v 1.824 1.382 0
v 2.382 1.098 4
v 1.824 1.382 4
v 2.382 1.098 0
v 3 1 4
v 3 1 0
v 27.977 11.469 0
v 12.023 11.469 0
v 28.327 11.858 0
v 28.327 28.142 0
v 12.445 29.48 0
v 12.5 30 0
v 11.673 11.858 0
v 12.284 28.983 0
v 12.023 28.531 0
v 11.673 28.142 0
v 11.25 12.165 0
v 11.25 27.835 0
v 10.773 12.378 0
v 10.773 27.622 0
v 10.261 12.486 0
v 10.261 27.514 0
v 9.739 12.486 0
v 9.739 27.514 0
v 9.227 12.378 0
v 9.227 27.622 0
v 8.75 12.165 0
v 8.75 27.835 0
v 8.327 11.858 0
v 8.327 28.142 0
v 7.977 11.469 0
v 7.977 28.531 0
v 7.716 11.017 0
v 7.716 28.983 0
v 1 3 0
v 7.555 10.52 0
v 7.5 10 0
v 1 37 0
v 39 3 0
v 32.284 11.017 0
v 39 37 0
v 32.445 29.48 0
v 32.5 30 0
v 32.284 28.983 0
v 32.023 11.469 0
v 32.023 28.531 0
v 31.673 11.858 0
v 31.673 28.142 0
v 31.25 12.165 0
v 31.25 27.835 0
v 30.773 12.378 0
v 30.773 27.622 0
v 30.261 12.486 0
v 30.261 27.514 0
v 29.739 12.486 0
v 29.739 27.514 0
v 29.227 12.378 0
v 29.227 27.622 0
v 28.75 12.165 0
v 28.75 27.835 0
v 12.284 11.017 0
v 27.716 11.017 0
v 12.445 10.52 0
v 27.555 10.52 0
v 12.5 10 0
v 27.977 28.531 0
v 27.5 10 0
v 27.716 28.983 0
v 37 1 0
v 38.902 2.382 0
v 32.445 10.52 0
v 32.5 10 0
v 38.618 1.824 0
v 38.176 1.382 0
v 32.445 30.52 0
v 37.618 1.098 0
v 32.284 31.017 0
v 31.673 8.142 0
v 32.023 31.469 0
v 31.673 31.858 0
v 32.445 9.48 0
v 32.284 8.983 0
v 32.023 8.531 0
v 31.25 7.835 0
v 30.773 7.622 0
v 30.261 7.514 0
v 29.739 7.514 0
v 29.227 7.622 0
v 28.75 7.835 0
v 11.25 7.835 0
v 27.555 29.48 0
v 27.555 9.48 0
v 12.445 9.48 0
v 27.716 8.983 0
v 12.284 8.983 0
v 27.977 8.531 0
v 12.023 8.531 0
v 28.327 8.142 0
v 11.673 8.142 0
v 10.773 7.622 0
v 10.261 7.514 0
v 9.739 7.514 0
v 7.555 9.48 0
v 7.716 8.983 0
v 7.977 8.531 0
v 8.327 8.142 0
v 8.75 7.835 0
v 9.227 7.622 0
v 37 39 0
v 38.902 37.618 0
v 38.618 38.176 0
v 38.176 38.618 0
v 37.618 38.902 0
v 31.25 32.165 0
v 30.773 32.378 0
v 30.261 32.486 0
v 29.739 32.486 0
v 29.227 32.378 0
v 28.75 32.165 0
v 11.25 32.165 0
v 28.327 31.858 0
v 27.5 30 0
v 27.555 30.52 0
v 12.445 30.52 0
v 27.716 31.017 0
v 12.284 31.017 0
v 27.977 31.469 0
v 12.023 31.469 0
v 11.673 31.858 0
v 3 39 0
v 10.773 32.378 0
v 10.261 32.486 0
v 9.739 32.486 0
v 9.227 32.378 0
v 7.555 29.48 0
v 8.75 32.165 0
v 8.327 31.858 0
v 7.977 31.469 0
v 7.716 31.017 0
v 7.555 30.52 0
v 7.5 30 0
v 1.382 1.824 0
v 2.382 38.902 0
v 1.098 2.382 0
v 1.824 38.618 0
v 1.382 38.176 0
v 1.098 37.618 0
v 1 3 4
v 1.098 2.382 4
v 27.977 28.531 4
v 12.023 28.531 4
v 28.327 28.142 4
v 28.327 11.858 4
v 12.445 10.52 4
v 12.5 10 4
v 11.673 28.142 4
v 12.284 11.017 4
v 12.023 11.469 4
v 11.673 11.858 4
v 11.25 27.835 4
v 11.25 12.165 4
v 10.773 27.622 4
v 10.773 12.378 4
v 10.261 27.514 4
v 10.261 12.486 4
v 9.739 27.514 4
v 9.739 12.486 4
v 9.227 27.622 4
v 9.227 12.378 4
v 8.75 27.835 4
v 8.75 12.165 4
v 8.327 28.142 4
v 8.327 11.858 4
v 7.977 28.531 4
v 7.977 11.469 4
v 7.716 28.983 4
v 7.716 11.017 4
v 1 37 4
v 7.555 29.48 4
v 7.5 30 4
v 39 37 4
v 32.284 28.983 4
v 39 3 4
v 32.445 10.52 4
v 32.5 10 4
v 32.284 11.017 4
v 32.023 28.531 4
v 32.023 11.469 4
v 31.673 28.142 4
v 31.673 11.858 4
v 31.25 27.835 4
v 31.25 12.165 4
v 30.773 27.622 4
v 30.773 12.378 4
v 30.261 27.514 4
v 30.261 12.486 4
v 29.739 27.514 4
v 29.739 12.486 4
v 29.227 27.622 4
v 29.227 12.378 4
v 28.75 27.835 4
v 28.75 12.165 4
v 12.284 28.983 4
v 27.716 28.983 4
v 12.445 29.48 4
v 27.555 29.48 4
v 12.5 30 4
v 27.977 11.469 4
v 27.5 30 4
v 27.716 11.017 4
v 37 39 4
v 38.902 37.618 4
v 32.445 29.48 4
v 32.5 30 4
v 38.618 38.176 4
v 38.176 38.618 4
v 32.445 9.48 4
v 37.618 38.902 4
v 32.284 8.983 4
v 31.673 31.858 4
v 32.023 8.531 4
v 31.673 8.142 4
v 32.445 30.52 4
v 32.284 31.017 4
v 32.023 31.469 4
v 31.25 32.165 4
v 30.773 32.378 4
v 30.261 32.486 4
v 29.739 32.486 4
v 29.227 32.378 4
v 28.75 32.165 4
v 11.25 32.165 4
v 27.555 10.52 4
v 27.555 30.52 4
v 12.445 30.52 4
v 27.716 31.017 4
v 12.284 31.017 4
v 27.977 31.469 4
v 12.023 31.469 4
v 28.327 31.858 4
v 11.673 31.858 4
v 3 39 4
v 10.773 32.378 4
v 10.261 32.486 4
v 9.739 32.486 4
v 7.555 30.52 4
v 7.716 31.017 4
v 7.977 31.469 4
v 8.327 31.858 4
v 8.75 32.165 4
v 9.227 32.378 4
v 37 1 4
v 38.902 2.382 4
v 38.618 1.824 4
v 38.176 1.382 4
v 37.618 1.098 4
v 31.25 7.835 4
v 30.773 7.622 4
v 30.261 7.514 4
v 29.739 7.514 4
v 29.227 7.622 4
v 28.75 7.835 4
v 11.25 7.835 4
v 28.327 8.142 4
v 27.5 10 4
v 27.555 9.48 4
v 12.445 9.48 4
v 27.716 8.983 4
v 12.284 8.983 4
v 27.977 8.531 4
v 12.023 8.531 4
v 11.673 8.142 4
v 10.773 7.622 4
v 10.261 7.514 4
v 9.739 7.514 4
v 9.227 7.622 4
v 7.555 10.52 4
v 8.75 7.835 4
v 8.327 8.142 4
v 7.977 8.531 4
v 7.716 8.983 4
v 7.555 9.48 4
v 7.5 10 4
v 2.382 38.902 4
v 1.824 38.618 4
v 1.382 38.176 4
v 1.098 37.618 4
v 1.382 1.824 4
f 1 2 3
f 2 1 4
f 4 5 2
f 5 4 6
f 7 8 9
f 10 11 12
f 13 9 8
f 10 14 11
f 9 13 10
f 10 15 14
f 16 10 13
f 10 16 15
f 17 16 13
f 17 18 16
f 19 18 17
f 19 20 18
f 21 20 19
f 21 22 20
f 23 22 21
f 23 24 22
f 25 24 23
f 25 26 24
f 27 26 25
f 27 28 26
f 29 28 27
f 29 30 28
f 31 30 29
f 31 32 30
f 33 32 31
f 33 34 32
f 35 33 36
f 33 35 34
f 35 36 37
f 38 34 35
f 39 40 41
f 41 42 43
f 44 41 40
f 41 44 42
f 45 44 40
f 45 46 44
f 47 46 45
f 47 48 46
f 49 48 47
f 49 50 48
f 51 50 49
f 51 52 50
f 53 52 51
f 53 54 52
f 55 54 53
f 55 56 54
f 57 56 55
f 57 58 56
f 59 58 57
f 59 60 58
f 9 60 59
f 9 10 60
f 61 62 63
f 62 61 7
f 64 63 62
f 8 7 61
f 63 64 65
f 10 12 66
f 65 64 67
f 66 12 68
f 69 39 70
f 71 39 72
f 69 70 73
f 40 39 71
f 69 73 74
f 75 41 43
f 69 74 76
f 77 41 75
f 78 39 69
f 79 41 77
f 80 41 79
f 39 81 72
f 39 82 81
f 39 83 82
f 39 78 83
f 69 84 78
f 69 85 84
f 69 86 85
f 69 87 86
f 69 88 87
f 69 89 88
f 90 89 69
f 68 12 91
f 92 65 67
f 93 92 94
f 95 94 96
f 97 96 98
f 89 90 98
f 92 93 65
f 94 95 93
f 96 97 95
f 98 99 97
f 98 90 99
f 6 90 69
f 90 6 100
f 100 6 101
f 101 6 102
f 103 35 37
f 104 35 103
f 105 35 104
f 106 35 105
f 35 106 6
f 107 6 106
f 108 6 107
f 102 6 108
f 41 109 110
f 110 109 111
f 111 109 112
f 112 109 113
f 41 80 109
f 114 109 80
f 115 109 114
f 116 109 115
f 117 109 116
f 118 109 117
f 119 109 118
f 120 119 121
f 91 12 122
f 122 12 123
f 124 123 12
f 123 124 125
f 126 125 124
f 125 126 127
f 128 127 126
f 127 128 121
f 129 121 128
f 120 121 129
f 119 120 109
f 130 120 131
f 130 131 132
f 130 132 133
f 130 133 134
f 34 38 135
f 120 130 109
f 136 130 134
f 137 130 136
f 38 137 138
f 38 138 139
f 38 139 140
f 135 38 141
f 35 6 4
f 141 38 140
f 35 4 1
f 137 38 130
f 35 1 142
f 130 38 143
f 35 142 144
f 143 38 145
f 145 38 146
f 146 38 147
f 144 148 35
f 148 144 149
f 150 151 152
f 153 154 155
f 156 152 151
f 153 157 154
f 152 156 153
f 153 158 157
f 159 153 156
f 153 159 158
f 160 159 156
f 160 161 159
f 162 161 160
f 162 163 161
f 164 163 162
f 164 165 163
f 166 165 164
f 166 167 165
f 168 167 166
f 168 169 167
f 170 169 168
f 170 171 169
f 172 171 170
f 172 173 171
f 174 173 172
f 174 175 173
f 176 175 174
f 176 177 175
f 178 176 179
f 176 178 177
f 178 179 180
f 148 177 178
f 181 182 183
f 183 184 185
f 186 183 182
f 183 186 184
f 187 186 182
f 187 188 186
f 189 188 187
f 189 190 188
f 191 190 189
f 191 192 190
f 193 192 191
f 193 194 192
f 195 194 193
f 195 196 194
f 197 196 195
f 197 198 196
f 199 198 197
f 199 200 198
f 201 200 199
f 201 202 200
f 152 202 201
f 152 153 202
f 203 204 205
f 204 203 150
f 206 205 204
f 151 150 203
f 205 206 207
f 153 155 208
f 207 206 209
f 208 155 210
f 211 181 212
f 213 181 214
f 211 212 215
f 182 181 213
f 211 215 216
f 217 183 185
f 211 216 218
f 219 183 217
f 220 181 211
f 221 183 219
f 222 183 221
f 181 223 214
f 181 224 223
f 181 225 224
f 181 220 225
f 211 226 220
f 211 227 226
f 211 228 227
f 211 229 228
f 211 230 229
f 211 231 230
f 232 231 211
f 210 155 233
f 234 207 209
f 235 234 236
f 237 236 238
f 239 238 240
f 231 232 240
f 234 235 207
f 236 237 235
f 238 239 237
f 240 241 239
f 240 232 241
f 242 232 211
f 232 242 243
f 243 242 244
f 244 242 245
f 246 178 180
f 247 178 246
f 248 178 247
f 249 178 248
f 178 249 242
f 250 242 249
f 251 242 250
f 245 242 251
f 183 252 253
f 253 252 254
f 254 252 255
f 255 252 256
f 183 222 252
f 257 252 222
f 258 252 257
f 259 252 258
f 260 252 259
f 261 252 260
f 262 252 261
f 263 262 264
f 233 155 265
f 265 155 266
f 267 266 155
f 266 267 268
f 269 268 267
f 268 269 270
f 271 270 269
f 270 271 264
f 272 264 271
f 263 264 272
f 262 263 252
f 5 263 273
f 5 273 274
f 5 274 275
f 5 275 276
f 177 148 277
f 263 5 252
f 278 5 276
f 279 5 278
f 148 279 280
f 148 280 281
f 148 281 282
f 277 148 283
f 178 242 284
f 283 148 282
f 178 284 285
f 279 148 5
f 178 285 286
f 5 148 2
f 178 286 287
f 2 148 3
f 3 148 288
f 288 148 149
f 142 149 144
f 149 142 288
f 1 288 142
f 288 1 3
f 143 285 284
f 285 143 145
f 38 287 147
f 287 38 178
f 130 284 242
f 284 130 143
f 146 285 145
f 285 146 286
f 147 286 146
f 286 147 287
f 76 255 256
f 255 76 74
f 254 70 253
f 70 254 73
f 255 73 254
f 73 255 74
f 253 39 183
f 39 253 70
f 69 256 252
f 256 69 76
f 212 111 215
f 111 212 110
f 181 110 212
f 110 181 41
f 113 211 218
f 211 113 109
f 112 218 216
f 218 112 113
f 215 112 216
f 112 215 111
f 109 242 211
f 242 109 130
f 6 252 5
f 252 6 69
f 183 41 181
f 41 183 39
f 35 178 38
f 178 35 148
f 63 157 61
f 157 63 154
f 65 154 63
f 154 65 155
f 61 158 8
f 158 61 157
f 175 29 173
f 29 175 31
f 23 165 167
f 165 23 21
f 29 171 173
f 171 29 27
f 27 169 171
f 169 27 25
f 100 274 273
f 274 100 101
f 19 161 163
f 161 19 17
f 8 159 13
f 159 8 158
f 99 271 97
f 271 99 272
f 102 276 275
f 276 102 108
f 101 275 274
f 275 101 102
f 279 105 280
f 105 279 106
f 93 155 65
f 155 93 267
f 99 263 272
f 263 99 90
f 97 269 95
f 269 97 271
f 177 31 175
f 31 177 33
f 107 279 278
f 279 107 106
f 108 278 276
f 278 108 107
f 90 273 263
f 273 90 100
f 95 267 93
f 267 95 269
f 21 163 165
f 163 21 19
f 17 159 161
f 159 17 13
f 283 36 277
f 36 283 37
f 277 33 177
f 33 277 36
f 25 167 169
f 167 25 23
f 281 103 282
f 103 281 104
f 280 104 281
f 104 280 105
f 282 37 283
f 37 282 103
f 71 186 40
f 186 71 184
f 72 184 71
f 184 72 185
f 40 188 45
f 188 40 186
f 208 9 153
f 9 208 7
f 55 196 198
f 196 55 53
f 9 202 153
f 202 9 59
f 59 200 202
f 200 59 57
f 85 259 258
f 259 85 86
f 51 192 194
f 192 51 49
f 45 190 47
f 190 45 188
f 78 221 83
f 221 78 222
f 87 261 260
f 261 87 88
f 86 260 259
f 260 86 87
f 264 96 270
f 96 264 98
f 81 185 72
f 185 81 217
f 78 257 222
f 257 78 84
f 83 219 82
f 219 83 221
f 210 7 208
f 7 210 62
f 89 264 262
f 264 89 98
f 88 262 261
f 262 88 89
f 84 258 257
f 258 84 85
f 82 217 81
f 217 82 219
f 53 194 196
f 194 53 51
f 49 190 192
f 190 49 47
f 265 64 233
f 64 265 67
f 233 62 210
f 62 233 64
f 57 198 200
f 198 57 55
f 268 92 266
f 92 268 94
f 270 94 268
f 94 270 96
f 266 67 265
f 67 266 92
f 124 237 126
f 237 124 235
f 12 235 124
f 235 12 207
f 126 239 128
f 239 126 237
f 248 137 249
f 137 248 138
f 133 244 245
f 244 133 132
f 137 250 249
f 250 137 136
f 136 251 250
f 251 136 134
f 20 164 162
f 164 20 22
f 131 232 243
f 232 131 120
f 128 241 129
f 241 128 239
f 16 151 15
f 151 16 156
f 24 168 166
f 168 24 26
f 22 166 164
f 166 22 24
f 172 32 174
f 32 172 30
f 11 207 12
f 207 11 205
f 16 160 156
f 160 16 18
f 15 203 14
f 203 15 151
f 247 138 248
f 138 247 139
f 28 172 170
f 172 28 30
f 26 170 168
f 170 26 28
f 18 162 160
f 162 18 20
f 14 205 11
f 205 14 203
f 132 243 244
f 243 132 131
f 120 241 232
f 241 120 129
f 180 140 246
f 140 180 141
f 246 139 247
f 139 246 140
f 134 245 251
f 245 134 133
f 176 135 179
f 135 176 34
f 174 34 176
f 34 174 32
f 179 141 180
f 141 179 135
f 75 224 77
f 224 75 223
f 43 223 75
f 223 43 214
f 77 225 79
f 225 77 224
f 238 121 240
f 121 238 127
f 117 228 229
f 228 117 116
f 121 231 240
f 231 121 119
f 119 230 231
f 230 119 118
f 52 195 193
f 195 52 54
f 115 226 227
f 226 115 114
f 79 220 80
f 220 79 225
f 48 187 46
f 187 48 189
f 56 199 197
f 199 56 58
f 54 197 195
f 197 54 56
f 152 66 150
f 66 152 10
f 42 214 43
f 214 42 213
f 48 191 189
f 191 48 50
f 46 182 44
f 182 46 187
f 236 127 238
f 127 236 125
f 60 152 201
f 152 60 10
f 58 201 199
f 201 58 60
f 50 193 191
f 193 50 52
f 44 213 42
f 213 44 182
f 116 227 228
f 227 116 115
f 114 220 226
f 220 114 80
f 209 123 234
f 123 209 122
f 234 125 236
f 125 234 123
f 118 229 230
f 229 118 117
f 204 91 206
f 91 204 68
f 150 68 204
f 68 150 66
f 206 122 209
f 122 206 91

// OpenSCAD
// v1
// Pour raccorder 2 V-slots
// arrondir les angles
// Enlever 1 mm sur les bords pour éviter les frottements. 

include <./MCAD/boxes.scad>
// exemple !
// roundedBox([20, 30, 40], 2, true);
A_x = 40;
B_y = 40;

edge = 1 ; // enlever cette valeur des bords.
epp = 4 ;

dia = 5 ;  // diameter of holes
eps = 0.01 ; 


module connector(A, B){
    difference() {
    // cube([A_x, B_y, epp]);
        translate([A/2, B/2, epp/2])
    roundedBox([A - (2* edge), B -(2 * edge), epp], 2, true, $fn=20);
    {
        // holes on X axis
        for (i = [ 0 : 2 ]) {
          translate([10 +  i*20, 10, 0-eps])
            cylinder(r=dia/2, h=10 + 2*eps, $fn = 30);         
          };
        for (j = [ 0 : 2 ]) {
          translate([10 +  j*20, 30, 0-eps])
            cylinder(r=dia/2, h=10 + 2*eps, $fn = 30);         
          };
 
    }
    }
}

module narrow_connector(){
    connector(A_x, B_y); 
};

narrow_connector(); 


// connector();
